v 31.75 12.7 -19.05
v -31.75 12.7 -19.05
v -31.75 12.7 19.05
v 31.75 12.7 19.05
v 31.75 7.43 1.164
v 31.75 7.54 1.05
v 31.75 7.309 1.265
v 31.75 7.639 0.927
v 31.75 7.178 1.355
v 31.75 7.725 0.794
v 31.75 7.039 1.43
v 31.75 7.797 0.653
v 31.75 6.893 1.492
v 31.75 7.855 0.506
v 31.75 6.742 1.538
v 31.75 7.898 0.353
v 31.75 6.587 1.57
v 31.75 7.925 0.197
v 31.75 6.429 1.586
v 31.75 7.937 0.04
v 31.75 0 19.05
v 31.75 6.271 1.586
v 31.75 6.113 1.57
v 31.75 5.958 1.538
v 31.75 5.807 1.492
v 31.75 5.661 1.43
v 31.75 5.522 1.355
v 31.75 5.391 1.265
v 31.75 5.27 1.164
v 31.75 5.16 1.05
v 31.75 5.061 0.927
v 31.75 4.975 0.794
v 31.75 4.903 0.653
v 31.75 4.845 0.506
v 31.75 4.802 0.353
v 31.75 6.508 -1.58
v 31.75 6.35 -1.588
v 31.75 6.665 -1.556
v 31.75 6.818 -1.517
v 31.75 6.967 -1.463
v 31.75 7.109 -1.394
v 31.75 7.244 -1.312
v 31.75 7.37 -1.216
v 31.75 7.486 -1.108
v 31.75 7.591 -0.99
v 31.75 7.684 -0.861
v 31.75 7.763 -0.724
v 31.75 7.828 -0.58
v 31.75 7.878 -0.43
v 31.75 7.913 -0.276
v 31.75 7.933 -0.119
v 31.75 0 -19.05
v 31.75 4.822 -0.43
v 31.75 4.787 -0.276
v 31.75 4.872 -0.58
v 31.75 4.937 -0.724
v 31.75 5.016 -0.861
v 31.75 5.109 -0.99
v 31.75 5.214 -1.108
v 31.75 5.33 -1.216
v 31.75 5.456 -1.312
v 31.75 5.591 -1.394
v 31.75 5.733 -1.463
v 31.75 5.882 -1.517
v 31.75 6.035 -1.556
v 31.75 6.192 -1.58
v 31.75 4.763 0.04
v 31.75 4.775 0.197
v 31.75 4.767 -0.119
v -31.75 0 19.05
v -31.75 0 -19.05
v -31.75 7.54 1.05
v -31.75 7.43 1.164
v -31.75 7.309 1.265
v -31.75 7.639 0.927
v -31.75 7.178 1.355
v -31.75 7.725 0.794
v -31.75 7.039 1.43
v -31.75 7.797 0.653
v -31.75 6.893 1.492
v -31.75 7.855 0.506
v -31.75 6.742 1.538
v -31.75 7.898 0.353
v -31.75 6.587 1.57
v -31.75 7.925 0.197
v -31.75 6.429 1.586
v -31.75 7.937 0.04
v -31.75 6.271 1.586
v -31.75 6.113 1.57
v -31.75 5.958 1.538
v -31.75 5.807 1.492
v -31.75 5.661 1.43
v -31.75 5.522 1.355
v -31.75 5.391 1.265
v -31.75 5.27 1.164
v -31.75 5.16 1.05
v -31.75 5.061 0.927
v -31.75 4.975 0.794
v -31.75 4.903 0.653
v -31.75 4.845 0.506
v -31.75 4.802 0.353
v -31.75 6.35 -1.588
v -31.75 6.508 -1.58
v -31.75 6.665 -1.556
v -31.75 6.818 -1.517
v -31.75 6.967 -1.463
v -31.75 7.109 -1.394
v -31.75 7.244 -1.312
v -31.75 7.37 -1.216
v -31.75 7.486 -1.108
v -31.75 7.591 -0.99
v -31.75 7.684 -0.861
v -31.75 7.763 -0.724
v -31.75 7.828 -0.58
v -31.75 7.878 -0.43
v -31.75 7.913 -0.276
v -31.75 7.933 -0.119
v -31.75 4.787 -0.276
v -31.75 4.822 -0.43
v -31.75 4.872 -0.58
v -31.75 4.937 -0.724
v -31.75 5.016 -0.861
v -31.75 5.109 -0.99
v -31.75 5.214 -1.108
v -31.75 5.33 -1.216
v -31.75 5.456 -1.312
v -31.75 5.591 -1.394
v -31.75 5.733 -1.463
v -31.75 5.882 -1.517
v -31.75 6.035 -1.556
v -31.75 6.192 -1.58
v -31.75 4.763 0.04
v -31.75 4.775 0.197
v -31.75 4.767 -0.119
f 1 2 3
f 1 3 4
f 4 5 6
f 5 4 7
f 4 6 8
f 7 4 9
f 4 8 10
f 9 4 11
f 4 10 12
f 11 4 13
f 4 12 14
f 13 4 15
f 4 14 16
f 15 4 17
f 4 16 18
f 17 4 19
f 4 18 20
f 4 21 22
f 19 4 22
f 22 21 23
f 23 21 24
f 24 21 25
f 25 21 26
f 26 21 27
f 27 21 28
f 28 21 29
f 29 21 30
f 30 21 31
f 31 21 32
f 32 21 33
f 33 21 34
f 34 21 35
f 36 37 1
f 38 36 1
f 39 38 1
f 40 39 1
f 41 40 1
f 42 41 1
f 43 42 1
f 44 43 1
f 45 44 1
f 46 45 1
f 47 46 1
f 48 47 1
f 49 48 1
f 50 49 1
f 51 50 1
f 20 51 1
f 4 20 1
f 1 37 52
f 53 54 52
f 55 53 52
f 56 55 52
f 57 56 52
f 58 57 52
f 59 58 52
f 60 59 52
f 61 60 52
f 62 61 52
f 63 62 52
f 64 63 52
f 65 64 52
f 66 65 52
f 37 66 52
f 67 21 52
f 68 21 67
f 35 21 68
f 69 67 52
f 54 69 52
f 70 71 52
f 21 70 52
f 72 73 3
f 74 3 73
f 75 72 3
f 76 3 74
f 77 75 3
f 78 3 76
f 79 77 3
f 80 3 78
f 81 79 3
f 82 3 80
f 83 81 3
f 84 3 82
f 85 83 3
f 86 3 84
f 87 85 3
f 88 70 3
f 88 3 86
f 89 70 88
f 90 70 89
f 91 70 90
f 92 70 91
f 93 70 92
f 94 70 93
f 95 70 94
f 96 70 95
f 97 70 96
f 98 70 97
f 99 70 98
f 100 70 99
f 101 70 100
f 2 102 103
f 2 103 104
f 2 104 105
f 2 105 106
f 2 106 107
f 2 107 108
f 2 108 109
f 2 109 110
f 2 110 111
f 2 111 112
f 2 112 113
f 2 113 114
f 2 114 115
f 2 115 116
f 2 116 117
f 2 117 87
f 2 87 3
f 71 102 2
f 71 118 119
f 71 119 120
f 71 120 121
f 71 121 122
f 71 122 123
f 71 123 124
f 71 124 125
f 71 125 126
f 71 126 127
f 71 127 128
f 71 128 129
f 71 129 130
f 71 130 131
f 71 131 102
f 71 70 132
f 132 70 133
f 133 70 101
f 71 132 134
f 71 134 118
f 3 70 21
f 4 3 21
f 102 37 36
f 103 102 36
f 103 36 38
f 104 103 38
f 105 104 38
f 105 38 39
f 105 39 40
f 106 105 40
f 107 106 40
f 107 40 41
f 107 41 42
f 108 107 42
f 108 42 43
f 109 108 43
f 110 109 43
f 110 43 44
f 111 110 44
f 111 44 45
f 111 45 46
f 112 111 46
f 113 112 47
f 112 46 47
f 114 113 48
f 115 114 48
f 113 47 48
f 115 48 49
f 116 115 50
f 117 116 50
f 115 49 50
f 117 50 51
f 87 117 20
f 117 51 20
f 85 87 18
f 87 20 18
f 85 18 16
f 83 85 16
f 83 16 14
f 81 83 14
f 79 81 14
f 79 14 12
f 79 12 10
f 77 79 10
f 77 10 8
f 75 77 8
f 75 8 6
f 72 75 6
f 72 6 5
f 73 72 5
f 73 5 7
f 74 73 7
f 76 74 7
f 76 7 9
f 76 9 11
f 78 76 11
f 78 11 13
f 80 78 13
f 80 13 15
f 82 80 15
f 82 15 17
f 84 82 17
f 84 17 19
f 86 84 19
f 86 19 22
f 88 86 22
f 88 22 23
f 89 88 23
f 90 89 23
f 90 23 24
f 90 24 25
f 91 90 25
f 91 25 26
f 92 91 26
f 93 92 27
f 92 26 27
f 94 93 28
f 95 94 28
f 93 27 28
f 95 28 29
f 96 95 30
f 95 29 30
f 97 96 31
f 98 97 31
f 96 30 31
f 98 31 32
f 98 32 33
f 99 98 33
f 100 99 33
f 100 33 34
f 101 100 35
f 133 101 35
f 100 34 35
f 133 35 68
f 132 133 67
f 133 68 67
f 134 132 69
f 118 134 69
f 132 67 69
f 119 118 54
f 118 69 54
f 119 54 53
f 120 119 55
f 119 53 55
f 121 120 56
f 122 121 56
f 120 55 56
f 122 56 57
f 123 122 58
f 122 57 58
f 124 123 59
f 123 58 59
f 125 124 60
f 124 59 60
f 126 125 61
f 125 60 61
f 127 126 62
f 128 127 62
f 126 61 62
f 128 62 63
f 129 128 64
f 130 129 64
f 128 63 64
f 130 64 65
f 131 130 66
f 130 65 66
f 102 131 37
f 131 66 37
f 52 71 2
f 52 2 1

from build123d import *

# Parameters (mm, degrees)
SKETCH1_W                    = 63.5
SKETCH1_H                    = 38.1
BOSS_EXTRUDE1_DEPTH          = 12.7
F_1_8_0_125_DIAMETER_HOLE1_D = 3.175


with BuildPart() as part:
    # Sketch1 → Boss-Extrude1 (new body)
    with BuildSketch(Plane(origin=(0, 0, 0), x_dir=(1, 0, 0), z_dir=(0, 1, 0))):
        Rectangle(SKETCH1_W, SKETCH1_H)
    extrude(amount=BOSS_EXTRUDE1_DEPTH)

    # 1/8 (0.125) Diameter Hole1 (through all)
    with Locations(Plane.ZY.offset(31.75)):
        with Locations((0, 6.35)):
            Hole(F_1_8_0_125_DIAMETER_HOLE1_D / 2)


solid = part.part
